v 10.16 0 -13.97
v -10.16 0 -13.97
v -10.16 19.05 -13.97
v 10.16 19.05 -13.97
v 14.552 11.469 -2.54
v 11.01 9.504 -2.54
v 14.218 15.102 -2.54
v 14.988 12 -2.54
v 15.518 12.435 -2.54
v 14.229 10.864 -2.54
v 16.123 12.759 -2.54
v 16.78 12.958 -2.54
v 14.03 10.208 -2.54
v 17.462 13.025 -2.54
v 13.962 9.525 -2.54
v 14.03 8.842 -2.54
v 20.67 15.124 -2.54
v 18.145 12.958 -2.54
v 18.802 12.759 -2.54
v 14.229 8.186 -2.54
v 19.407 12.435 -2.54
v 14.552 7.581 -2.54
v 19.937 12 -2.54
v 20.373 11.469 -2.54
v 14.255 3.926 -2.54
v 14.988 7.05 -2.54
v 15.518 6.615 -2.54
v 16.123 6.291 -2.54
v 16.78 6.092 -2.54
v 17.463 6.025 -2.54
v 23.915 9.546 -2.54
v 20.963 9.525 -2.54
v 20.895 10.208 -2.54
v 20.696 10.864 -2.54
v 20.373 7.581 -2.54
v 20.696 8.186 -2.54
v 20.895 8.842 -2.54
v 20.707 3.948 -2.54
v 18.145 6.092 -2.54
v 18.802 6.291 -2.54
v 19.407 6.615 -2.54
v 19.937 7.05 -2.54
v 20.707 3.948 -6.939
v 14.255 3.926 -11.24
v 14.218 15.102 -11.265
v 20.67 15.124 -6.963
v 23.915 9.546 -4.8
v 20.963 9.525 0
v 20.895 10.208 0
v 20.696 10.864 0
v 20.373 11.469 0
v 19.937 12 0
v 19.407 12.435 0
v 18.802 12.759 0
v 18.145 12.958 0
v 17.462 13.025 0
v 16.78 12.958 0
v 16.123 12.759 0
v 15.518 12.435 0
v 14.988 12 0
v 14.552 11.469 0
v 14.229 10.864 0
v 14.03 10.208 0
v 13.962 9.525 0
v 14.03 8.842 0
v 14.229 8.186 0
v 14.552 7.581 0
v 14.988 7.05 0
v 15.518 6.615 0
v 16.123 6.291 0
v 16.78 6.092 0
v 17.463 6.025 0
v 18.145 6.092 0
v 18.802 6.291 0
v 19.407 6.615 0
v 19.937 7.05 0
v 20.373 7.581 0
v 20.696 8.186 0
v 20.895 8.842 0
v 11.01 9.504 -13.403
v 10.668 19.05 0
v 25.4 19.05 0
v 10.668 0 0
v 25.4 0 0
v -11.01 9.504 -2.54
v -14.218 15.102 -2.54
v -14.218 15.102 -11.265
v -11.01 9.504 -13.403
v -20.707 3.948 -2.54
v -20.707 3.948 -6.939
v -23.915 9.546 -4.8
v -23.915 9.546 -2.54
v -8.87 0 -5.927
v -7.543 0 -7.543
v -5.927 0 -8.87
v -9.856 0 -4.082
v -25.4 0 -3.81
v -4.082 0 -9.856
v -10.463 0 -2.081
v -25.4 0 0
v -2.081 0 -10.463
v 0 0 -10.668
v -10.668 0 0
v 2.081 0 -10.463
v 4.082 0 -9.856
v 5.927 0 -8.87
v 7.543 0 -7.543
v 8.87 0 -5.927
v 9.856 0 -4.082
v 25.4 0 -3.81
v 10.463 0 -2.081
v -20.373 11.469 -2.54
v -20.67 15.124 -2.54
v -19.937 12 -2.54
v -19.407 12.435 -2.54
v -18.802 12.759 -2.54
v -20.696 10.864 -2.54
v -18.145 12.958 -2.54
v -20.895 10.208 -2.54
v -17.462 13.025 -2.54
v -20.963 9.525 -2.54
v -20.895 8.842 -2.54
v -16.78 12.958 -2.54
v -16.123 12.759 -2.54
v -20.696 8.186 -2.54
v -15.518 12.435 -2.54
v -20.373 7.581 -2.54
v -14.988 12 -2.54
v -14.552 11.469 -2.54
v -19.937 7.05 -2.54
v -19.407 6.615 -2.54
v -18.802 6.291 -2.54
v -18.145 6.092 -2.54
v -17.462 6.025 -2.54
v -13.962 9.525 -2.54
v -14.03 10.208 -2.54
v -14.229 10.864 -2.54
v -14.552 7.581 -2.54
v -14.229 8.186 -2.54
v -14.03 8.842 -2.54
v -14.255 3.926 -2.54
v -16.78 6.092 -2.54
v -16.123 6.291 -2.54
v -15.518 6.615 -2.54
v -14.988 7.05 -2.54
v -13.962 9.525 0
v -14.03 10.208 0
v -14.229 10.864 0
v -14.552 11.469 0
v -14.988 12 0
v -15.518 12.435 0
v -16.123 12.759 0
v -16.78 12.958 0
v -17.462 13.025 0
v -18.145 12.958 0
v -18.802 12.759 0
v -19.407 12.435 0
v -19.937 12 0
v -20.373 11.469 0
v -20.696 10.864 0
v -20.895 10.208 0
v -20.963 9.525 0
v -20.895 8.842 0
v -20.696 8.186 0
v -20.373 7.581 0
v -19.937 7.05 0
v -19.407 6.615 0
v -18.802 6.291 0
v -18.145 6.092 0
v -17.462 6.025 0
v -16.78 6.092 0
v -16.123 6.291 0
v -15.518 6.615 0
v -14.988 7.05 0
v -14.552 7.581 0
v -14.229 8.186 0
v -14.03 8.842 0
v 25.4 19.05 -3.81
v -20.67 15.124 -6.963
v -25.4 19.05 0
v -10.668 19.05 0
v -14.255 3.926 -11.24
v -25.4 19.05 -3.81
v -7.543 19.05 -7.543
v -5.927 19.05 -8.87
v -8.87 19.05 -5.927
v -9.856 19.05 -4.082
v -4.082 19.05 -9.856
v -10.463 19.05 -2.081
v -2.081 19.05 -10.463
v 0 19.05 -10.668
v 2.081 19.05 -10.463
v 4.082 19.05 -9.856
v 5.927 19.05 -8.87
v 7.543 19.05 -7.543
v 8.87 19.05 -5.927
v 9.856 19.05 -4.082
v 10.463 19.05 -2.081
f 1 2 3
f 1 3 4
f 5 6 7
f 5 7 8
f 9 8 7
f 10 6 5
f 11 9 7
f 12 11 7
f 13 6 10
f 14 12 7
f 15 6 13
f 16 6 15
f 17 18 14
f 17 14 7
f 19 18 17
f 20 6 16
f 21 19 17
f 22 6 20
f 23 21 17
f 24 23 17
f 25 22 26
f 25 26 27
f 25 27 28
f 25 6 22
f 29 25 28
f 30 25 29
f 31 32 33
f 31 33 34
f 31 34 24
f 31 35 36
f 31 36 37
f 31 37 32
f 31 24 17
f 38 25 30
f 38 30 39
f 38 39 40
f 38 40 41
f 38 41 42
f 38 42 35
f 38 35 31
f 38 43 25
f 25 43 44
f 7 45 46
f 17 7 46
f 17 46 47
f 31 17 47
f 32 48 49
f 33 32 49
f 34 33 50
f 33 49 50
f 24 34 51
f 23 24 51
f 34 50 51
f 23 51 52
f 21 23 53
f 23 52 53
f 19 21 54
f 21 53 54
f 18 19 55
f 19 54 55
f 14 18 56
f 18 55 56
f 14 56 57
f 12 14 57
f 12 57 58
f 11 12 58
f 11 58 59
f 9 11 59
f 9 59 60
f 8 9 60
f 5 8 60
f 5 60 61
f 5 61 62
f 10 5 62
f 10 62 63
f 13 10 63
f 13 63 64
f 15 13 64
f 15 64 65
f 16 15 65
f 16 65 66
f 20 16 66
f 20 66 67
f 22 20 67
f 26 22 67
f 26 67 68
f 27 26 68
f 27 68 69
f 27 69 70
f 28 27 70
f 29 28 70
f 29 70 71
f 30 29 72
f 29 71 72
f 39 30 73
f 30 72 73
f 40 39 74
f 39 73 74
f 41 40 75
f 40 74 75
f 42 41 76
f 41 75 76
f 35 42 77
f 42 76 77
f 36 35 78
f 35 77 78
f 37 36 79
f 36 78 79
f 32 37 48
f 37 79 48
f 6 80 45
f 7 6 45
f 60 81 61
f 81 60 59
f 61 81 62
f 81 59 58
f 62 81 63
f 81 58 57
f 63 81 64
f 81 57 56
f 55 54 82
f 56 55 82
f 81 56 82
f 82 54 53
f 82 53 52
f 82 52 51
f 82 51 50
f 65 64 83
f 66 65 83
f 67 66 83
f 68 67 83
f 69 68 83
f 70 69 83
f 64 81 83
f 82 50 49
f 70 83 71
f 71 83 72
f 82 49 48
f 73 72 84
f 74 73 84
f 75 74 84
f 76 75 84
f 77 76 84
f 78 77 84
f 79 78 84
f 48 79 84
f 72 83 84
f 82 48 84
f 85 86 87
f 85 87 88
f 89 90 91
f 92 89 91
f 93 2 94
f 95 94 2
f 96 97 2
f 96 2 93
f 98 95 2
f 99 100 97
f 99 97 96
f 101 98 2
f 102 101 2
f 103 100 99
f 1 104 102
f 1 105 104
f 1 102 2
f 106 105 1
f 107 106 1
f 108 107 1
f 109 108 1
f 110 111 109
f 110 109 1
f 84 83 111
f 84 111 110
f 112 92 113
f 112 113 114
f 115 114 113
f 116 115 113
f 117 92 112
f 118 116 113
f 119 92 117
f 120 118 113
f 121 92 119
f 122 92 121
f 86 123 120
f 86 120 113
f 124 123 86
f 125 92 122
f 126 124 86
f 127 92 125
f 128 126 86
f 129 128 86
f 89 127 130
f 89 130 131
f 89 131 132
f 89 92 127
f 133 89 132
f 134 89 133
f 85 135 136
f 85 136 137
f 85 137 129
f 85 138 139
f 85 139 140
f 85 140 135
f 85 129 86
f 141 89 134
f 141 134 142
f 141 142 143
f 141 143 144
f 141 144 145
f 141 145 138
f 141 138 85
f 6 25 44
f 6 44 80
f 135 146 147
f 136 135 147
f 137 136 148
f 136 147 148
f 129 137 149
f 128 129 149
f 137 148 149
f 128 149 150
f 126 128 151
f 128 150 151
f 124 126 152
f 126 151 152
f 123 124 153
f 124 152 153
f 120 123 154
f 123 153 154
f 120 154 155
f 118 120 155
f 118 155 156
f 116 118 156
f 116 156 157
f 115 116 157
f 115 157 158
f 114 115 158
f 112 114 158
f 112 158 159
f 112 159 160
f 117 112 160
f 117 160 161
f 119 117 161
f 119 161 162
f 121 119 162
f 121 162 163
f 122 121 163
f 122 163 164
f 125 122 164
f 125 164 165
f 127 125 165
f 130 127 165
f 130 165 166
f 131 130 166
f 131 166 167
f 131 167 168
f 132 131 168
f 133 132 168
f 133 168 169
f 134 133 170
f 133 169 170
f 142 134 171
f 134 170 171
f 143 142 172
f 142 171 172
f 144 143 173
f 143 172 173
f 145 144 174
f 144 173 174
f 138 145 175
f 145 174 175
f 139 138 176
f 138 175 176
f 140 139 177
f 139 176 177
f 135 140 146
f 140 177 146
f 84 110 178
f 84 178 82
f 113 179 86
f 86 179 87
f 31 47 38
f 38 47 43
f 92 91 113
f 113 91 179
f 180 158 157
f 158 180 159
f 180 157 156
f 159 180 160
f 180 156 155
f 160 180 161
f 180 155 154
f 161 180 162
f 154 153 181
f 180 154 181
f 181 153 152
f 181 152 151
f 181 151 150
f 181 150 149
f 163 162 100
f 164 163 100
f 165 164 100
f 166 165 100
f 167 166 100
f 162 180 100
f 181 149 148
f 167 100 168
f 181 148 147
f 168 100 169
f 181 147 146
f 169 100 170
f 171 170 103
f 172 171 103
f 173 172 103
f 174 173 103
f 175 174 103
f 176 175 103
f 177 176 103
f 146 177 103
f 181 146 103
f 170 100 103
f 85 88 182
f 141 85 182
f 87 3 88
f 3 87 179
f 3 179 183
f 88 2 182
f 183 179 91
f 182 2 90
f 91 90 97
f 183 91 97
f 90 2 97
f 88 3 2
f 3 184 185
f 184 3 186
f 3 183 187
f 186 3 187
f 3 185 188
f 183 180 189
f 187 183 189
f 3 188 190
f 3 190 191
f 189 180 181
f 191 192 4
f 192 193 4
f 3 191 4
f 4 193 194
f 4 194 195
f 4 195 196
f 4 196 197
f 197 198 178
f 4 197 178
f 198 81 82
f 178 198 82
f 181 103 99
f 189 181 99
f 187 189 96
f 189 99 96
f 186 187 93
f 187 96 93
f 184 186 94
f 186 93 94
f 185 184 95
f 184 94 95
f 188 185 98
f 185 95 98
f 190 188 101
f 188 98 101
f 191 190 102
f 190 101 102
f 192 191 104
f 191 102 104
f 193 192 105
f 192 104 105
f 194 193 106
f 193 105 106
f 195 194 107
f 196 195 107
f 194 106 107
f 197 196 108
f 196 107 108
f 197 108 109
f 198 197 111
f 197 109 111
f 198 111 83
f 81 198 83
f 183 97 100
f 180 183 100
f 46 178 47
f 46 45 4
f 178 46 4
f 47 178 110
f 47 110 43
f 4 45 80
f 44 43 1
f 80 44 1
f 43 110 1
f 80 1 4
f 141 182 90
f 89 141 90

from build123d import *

# Parameters (mm, degrees)
F0_W     = 50.8
F0_H     = 13.97
F1_DEPTH = 19.05
F3_DEPTH = 19.05
F5_DEPTH = 25.4
F6_R     = 3.5000041341
F7_DEPTH = 25.4
F9_DEPTH = 11.43


with BuildPart() as f1:
    # F0 (on Front) → F1 (new body)
    with BuildSketch(Plane.XZ):
        with Locations((0, -6.985)):
            Rectangle(F0_W, F0_H)
    extrude(amount=-F1_DEPTH)

    # F2 (on face) → F3 (cut)
    with BuildSketch(Plane.XZ):
        with BuildLine():
            ThreePointArc((-10.668, 0), (0, -10.668), (10.668, 0))
            Line((10.668, 0), (-10.668, 0))
        make_face()
    extrude(amount=-F3_DEPTH, mode=Mode.SUBTRACT)

    # F4 (on face) → F5 (cut)
    with BuildSketch(Plane.XZ):
        Polygon((-25.4, -3.81), (-25.4, -13.97), (-10.16, -13.97), align=None)
        Polygon((25.4, -13.97), (25.4, -3.81), (10.16, -13.97), align=None)
    extrude(amount=-F5_DEPTH, mode=Mode.SUBTRACT)

    # F6 (on face) → F7 (cut)
    with BuildSketch(Plane.XY):
        with Locations((-17.4625, 9.525)):
            Circle(F6_R)
        with Locations((17.4625, 9.525)):
            Circle(F6_R)
    extrude(amount=-F7_DEPTH, mode=Mode.SUBTRACT)

    # F8 (on face) → F9 (cut)
    with BuildSketch(Plane(origin=(0, 0, -13.97), x_dir=(1, 0, 0), z_dir=(0, 0, -1))):
        Polygon((-14.2547823489, -3.9263508054), (-20.7072136039, -3.9477104287), (-23.9149312549, -9.5463596233), (-20.6702176511, -15.1236491946), (-14.2177863961, -15.1022895713), (-11.0100687451, -9.5036403767), align=None)
        Polygon((23.9149312549, -9.5463596233), (20.7072136039, -3.9477104287), (14.2547823489, -3.9263508054), (11.0100687451, -9.5036403767), (14.2177863961, -15.1022895713), (20.6702176511, -15.1236491946), align=None)
    extrude(amount=-F9_DEPTH, mode=Mode.SUBTRACT)


solid = f1.part
